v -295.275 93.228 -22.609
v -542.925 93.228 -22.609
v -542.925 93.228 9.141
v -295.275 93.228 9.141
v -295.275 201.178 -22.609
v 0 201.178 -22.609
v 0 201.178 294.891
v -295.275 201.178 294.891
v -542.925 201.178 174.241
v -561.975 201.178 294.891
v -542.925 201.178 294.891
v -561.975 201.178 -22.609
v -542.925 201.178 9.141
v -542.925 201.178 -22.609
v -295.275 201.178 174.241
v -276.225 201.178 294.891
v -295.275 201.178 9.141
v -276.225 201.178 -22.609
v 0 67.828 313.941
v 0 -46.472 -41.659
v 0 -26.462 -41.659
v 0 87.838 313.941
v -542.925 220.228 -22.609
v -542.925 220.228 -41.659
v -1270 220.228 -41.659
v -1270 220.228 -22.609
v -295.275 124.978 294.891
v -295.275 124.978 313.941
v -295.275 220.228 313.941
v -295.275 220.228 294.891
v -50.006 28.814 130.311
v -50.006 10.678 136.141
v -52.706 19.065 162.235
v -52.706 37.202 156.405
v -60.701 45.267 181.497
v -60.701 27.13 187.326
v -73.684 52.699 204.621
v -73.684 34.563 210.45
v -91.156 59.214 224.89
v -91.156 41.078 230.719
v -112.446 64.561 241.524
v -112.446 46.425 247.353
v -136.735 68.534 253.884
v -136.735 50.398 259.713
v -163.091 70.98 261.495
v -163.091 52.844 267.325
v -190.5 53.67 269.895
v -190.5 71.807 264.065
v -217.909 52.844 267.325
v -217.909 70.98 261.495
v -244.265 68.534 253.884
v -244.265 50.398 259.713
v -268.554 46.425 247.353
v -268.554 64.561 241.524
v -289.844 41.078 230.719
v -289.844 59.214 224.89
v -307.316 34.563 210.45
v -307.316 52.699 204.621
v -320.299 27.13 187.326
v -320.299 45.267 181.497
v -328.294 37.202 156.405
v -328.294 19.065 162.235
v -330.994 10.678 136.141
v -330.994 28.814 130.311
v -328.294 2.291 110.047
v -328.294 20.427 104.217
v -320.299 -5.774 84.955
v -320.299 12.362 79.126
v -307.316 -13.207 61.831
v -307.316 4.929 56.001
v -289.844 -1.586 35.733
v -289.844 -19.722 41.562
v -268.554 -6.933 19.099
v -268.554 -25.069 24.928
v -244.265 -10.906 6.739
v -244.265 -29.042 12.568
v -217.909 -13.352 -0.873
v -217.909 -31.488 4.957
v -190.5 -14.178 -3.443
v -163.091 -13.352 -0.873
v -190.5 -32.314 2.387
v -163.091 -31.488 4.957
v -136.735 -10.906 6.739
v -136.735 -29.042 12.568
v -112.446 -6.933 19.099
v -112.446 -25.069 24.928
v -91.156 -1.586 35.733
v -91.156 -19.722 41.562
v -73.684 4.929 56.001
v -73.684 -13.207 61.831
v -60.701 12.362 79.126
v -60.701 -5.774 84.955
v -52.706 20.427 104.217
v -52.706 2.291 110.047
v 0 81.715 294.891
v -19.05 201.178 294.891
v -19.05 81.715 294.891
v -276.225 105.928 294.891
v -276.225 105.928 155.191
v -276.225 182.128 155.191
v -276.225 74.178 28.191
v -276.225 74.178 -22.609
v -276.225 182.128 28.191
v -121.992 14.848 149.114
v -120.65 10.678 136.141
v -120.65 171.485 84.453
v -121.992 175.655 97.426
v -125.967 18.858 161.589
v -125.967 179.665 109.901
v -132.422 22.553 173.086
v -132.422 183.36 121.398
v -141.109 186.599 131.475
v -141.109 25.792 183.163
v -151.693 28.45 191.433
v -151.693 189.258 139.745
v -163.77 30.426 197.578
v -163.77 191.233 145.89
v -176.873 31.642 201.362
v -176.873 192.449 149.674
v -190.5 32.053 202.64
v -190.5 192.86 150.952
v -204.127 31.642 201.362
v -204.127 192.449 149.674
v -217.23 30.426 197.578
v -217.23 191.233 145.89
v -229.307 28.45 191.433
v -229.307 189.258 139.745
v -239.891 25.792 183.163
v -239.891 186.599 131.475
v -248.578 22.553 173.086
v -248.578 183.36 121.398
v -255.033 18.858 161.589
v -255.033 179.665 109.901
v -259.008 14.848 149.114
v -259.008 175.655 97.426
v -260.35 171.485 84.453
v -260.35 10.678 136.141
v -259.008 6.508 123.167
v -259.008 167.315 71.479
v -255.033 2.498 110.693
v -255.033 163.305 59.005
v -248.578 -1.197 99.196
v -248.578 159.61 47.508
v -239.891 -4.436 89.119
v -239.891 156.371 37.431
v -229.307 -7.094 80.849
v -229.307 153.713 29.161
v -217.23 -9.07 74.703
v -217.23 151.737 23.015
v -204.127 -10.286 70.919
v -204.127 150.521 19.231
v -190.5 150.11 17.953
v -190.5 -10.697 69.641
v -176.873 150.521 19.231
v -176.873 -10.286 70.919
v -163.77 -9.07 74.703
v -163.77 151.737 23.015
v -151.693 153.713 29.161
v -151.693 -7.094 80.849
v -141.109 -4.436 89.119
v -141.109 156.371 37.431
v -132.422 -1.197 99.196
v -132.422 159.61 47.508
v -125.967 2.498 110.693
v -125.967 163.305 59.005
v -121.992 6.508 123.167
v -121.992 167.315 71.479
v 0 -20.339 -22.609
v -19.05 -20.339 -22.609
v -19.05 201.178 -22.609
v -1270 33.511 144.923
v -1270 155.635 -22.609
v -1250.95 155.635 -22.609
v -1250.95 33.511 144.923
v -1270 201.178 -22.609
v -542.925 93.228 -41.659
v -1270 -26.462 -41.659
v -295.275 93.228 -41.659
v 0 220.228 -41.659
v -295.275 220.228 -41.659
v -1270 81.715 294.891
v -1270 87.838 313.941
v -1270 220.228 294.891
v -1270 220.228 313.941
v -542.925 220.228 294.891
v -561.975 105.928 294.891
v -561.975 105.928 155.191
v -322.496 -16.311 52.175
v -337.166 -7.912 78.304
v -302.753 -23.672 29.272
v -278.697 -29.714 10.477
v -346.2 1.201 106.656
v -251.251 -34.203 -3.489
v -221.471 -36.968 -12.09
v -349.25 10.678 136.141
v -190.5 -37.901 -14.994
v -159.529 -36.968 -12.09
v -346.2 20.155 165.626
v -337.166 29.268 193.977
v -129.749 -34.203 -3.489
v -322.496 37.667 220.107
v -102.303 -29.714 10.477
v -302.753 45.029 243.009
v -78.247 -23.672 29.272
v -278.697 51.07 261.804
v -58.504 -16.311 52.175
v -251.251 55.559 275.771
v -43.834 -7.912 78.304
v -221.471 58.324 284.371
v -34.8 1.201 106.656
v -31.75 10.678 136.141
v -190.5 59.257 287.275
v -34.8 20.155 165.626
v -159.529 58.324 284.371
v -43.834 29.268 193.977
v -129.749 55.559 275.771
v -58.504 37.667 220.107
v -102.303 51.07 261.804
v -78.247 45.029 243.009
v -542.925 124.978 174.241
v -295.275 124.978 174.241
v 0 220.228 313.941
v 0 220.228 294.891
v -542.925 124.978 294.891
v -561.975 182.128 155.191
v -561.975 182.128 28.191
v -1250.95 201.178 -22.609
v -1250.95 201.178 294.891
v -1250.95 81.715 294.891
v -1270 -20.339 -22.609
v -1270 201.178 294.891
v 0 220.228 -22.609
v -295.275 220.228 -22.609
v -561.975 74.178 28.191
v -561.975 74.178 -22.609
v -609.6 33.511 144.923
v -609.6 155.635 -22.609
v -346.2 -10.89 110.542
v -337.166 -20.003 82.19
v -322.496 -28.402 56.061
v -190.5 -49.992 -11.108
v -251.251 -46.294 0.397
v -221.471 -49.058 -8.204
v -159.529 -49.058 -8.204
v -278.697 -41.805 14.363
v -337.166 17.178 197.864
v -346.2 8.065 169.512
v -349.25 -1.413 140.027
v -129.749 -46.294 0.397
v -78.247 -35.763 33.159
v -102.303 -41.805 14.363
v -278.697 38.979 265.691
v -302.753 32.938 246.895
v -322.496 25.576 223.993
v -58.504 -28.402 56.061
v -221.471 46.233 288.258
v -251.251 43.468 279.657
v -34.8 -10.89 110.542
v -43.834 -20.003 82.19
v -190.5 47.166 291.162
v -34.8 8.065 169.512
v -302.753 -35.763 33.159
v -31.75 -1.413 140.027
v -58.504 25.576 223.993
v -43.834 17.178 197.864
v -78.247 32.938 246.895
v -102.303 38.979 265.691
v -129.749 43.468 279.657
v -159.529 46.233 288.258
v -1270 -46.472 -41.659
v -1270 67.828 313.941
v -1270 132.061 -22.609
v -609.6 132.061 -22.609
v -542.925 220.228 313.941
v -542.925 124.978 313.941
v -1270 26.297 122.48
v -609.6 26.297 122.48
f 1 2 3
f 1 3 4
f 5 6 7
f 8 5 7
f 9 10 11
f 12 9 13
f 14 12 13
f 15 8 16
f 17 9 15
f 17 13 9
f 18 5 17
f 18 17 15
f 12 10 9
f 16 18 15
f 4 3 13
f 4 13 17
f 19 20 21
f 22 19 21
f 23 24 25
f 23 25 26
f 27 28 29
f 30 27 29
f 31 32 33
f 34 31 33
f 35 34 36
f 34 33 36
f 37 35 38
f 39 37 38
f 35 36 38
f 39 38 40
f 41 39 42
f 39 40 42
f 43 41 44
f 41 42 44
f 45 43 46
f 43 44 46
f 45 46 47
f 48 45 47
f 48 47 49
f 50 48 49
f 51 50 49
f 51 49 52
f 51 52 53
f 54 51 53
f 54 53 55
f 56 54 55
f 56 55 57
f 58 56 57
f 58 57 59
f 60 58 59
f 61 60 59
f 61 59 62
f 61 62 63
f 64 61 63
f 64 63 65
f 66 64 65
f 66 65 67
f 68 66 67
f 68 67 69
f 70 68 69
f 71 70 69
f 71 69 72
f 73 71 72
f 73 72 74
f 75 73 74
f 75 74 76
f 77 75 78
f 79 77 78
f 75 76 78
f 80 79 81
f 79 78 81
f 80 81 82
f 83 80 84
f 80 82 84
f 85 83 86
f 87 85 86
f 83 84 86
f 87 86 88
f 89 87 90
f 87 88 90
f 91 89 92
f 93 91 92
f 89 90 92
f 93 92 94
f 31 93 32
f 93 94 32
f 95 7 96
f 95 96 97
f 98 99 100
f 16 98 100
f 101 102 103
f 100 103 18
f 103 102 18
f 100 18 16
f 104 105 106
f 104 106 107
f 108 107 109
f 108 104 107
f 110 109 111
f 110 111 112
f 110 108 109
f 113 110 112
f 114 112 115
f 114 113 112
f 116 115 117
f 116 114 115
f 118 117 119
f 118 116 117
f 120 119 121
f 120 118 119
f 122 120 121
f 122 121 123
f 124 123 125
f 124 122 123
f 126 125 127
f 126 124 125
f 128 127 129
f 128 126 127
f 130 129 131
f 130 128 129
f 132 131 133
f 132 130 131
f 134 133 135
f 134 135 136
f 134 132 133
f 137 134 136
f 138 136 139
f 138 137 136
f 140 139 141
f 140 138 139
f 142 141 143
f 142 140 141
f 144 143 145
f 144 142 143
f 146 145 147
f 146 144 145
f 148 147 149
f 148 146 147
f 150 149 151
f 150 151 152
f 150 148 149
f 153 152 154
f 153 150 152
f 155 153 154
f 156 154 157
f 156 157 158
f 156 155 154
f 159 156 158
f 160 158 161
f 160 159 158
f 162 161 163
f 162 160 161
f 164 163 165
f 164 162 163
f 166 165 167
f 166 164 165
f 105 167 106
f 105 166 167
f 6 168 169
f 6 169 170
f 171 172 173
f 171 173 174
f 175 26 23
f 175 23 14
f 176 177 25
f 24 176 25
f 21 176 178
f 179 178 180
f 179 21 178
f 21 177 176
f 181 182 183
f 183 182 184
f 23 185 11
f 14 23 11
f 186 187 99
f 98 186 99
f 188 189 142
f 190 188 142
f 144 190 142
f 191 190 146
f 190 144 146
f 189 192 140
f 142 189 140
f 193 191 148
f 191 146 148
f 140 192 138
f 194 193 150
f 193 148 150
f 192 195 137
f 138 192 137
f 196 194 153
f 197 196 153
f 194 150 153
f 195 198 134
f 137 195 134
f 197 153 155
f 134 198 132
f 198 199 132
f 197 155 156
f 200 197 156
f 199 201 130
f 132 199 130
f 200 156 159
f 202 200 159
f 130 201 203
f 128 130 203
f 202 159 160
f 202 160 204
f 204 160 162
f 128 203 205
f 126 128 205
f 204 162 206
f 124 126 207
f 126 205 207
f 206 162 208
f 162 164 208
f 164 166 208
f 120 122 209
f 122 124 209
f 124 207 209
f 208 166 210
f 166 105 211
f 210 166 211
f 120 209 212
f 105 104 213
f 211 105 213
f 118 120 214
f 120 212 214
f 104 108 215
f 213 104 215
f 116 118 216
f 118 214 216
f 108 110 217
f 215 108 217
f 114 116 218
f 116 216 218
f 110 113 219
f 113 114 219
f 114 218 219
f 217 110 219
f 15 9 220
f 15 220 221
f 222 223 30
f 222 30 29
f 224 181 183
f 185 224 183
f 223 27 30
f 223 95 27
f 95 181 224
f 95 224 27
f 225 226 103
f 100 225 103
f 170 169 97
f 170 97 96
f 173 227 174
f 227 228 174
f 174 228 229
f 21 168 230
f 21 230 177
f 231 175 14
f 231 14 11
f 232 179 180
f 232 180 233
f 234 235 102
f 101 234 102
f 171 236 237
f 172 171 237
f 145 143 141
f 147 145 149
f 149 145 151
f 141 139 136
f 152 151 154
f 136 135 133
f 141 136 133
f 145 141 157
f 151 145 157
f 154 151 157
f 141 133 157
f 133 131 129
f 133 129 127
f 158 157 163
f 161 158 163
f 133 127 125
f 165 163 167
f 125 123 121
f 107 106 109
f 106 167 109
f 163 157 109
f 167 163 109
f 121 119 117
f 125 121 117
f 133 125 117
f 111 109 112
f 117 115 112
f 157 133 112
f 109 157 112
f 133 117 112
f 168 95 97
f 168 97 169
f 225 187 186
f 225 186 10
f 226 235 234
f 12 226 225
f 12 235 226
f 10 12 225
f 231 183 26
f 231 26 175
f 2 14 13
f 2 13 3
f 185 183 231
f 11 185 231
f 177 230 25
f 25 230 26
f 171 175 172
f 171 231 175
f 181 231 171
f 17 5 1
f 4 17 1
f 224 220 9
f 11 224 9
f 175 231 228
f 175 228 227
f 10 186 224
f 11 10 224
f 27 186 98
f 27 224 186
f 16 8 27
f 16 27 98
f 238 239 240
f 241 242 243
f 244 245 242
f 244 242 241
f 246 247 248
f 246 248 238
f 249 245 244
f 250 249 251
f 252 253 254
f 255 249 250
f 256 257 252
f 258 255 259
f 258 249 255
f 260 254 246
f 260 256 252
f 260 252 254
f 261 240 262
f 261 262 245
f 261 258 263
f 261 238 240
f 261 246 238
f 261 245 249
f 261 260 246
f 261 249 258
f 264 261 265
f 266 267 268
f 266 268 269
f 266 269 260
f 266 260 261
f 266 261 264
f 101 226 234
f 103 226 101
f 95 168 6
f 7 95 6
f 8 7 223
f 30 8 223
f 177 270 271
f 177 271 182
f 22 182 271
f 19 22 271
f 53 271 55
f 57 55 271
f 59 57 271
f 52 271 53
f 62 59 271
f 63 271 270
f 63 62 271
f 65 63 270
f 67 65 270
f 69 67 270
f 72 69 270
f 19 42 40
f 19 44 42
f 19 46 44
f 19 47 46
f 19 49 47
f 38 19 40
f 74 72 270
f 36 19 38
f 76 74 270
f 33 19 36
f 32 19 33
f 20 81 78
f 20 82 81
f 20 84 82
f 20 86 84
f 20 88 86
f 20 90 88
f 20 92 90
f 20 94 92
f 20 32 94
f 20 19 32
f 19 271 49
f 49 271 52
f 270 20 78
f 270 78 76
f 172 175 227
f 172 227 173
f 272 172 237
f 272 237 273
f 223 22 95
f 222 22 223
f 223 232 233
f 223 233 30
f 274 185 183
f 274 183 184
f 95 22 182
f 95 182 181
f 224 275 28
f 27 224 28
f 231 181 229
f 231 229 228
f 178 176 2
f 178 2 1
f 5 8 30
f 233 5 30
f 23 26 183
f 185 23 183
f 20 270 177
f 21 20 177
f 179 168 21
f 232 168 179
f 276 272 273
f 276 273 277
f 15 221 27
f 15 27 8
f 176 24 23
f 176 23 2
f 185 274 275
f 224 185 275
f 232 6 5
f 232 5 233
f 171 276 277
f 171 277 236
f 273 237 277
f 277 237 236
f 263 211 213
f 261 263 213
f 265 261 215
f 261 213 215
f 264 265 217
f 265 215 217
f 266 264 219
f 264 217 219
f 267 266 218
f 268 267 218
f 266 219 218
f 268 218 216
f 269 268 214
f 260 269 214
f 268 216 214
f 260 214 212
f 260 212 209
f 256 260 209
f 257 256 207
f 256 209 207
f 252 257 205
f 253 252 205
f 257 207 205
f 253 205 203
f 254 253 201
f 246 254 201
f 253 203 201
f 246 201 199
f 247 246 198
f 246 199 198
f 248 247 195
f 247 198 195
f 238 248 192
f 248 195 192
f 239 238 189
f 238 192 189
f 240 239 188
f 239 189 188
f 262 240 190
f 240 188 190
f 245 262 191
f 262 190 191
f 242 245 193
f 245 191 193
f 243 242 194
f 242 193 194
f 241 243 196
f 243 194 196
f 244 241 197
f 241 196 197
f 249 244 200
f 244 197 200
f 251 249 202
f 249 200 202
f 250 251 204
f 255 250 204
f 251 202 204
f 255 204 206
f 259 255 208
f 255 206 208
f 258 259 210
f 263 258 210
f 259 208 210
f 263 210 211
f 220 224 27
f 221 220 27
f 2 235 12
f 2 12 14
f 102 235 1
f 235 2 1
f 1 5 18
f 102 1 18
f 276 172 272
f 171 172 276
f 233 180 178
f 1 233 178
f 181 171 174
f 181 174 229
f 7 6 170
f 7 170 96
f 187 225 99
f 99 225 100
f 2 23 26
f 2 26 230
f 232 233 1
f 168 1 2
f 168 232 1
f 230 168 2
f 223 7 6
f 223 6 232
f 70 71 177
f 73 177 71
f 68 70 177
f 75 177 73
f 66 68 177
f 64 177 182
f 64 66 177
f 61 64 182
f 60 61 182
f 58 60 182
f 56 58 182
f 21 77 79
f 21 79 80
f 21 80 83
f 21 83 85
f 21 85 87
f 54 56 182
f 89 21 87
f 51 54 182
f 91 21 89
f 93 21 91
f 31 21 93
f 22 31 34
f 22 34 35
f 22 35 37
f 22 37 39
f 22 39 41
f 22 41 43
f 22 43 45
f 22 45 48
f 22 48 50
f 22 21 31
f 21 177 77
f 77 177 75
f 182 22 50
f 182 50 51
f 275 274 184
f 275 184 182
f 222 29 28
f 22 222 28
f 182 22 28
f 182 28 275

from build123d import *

# Parameters (mm, degrees)
F1_DEPTH  = 1270
F0_W      = 19.05
F0_H      = 317.5
F2_DEPTH  = 295.275
F3_W      = 19.05
F3_H      = 317.5
F4_DEPTH  = 727.075
F6_DEPTH  = 50.8
F7_W      = 285.75
F7_H      = 19.05
F8_DEPTH  = 127
F9_W      = 285.75
F9_H      = 95.25
F10_DEPTH = 139.7
F11_DEPTH = 1270
F12_DEPTH = 1270
F13_R     = 140.49375
F14_DEPTH = 25.4
F15_R     = 69.85
F16_DEPTH = 168.91
F17_R     = 158.75
F18_DEPTH = 12.7
F19_DEPTH = 19.05
F21_DEPTH = 19.05
F22_DEPTH = 660.4
F23_W     = 247.65
F23_H     = 127
F24_DEPTH = 19.05
F25_W     = 247.65
F25_H     = 107.95
F26_DEPTH = 31.75
F28_DEPTH = 19.05
F29_W     = 247.65
F29_H     = 76.2
F30_DEPTH = 120.65


with BuildPart() as f1:
    # F0 (on Right) → F1 (new body)
    with BuildSketch(Plane.YZ):
        Polygon((-20.3388575805, -22.6093402624), (-26.4620718662, -41.6593402624), (220.2280242562, -41.6593402624), (220.2280242562, -22.6093402624), (201.1780242562, -22.6093402624), align=None)
    extrude(amount=-F1_DEPTH)

    # F23 (on face) → F24 (cut)
    with BuildSketch(Plane(origin=(0, 0, -41.6593402624), x_dir=(1, 0, 0), z_dir=(0, 0, -1))):
        with Locations((-419.1, -156.7280242562)):
            Rectangle(F23_W, F23_H)
    extrude(amount=-F24_DEPTH, mode=Mode.SUBTRACT)


with BuildPart() as f2:
    # F0 (on Right) → F2 (new body)
    with BuildSketch(Plane.YZ):
        with Locations((210.7030242562, 136.1406597376)):
            Rectangle(F0_W, F0_H)
    extrude(amount=-F2_DEPTH)


with BuildPart() as f4:
    # F3 (on face) → F4 (new body)
    with BuildSketch(Plane(origin=(-1270, 0, 0), x_dir=(0, -1, 0), z_dir=(-1, 0, 0))):
        with Locations((-210.7030242562, 136.1406597376)):
            Rectangle(F3_W, F3_H)
    extrude(amount=-F4_DEPTH)


with BuildPart() as f6:
    # F5 (on face) → F6 (new body)
    with BuildSketch(Plane.XY.offset(-22.6093402624)):
        Polygon((-276.225, 201.1780242562), (-542.925, 201.1780242562), (-561.975, 201.1780242562), (-561.975, 74.1780242562), (-276.225, 74.1780242562), align=None)
    extrude(amount=F6_DEPTH)

    # F7 (on face) → F8 (join)
    with BuildSketch(Plane.XY.offset(28.1906597376)):
        with Locations((-419.1, 191.6530242562)):
            Rectangle(F7_W, F7_H)
    extrude(amount=F8_DEPTH)

    # F9 (on face) → F10 (join)
    with BuildSketch(Plane.XY.offset(155.1906597376)):
        with Locations((-419.1, 153.5530242562)):
            Rectangle(F9_W, F9_H)
    extrude(amount=F10_DEPTH)

    # F25 (on face) → F26 (cut)
    with BuildSketch(Plane(origin=(0, 0, -22.6093402624), x_dir=(1, 0, 0), z_dir=(0, 0, -1))):
        with Locations((-419.1, -147.2030242562)):
            Rectangle(F25_W, F25_H)
    extrude(amount=-F26_DEPTH, mode=Mode.SUBTRACT)

    # F29 (on face) → F30 (cut)
    with BuildSketch(Plane.XY.offset(294.8906597376)):
        with Locations((-419.1, 163.0780242562)):
            Rectangle(F29_W, F29_H)
    extrude(amount=-F30_DEPTH, mode=Mode.SUBTRACT)


with BuildPart() as f11:
    # F0 (on Right) → F11 (new body)
    with BuildSketch(Plane.YZ):
        Polygon((220.2280242562, 313.9406597376), (87.8379281338, 313.9406597376), (81.7147138481, 294.8906597376), (201.1780242562, 294.8906597376), (220.2280242562, 294.8906597376), align=None)
    extrude(amount=-F11_DEPTH)

    # F27 (on face) → F28 (cut)
    with BuildSketch(Plane.XY.offset(313.9406597376)):
        Polygon((-542.925, 201.1780242562), (-542.925, 124.9780242562), (-295.275, 124.9780242562), (-295.275, 201.1780242562), (-295.275, 220.2280242562), (-542.925, 220.2280242562), align=None)
    extrude(amount=-F28_DEPTH, mode=Mode.SUBTRACT)


with BuildPart() as f12:
    # F0 (on Right) → F12 (new body)
    with BuildSketch(Plane.YZ):
        Polygon((67.8280242562, 313.9406597376), (-46.4719757438, -41.6593402624), (-26.4620718662, -41.6593402624), (-20.3388575805, -22.6093402624), (81.7147138481, 294.8906597376), (87.8379281338, 313.9406597376), align=None)
    extrude(amount=-F12_DEPTH)

    # F13 (on face) → F14 (cut)
    with BuildSketch(Plane(origin=(0, -29.9836707942, 9.6376084696), x_dir=(1, 0, 0), z_dir=(0, -0.9520285613, 0.3060091804))):
        with Locations((-190.5, 132.8773698735)):
            Circle(F13_R)
    extrude(amount=-F14_DEPTH, mode=Mode.SUBTRACT)


with BuildPart() as f16:
    # F15 (on face) → F16 (new body)
    with BuildSketch(Plane(origin=(0, -29.9836707942, 9.6376084696), x_dir=(1, 0, 0), z_dir=(0, -0.9520285613, 0.3060091804))):
        with Locations((-190.5, 132.8773698735)):
            Circle(F15_R)
    extrude(amount=-F16_DEPTH)

    # F17 (on face) → F18 (join)
    with BuildSketch(Plane(origin=(0, -29.9836707942, 9.6376084696), x_dir=(1, 0, 0), z_dir=(0, -0.9520285613, 0.3060091804))):
        with Locations((-190.5, 132.8773698735)):
            Circle(F17_R)
    extrude(amount=F18_DEPTH)


with BuildPart() as f19:
    # F0 (on Right) → F19 (new body)
    with BuildSketch(Plane.YZ):
        Polygon((81.7147138481, 294.8906597376), (-20.3388575805, -22.6093402624), (201.1780242562, -22.6093402624), (201.1780242562, 294.8906597376), align=None)
    extrude(amount=-F19_DEPTH)


with BuildPart() as f21:
    # F20 (on face) → F21 (new body)
    with BuildSketch(Plane(origin=(-1270, 0, 0), x_dir=(0, -1, 0), z_dir=(-1, 0, 0))):
        Polygon((-201.1780242562, -22.6093402624), (-155.6353369512, -22.6093402624), (-33.510861462, 144.923118981), (-81.7147138481, 294.8906597376), (-201.1780242562, 294.8906597376), align=None)
    extrude(amount=-F21_DEPTH)


with BuildPart() as f22:
    # F20 (on face) → F22 (new body)
    with BuildSketch(Plane(origin=(-1270, 0, 0), x_dir=(0, -1, 0), z_dir=(-1, 0, 0))):
        Polygon((-155.6353369512, -22.6093402624), (-132.0611424195, -22.6093402624), (-26.2969415145, 122.4798124775), (-33.510861462, 144.923118981), align=None)
    extrude(amount=-F22_DEPTH)


solid = Compound([f1.part, f2.part, f4.part, f6.part, f11.part, f12.part, f16.part, f19.part, f21.part, f22.part])
